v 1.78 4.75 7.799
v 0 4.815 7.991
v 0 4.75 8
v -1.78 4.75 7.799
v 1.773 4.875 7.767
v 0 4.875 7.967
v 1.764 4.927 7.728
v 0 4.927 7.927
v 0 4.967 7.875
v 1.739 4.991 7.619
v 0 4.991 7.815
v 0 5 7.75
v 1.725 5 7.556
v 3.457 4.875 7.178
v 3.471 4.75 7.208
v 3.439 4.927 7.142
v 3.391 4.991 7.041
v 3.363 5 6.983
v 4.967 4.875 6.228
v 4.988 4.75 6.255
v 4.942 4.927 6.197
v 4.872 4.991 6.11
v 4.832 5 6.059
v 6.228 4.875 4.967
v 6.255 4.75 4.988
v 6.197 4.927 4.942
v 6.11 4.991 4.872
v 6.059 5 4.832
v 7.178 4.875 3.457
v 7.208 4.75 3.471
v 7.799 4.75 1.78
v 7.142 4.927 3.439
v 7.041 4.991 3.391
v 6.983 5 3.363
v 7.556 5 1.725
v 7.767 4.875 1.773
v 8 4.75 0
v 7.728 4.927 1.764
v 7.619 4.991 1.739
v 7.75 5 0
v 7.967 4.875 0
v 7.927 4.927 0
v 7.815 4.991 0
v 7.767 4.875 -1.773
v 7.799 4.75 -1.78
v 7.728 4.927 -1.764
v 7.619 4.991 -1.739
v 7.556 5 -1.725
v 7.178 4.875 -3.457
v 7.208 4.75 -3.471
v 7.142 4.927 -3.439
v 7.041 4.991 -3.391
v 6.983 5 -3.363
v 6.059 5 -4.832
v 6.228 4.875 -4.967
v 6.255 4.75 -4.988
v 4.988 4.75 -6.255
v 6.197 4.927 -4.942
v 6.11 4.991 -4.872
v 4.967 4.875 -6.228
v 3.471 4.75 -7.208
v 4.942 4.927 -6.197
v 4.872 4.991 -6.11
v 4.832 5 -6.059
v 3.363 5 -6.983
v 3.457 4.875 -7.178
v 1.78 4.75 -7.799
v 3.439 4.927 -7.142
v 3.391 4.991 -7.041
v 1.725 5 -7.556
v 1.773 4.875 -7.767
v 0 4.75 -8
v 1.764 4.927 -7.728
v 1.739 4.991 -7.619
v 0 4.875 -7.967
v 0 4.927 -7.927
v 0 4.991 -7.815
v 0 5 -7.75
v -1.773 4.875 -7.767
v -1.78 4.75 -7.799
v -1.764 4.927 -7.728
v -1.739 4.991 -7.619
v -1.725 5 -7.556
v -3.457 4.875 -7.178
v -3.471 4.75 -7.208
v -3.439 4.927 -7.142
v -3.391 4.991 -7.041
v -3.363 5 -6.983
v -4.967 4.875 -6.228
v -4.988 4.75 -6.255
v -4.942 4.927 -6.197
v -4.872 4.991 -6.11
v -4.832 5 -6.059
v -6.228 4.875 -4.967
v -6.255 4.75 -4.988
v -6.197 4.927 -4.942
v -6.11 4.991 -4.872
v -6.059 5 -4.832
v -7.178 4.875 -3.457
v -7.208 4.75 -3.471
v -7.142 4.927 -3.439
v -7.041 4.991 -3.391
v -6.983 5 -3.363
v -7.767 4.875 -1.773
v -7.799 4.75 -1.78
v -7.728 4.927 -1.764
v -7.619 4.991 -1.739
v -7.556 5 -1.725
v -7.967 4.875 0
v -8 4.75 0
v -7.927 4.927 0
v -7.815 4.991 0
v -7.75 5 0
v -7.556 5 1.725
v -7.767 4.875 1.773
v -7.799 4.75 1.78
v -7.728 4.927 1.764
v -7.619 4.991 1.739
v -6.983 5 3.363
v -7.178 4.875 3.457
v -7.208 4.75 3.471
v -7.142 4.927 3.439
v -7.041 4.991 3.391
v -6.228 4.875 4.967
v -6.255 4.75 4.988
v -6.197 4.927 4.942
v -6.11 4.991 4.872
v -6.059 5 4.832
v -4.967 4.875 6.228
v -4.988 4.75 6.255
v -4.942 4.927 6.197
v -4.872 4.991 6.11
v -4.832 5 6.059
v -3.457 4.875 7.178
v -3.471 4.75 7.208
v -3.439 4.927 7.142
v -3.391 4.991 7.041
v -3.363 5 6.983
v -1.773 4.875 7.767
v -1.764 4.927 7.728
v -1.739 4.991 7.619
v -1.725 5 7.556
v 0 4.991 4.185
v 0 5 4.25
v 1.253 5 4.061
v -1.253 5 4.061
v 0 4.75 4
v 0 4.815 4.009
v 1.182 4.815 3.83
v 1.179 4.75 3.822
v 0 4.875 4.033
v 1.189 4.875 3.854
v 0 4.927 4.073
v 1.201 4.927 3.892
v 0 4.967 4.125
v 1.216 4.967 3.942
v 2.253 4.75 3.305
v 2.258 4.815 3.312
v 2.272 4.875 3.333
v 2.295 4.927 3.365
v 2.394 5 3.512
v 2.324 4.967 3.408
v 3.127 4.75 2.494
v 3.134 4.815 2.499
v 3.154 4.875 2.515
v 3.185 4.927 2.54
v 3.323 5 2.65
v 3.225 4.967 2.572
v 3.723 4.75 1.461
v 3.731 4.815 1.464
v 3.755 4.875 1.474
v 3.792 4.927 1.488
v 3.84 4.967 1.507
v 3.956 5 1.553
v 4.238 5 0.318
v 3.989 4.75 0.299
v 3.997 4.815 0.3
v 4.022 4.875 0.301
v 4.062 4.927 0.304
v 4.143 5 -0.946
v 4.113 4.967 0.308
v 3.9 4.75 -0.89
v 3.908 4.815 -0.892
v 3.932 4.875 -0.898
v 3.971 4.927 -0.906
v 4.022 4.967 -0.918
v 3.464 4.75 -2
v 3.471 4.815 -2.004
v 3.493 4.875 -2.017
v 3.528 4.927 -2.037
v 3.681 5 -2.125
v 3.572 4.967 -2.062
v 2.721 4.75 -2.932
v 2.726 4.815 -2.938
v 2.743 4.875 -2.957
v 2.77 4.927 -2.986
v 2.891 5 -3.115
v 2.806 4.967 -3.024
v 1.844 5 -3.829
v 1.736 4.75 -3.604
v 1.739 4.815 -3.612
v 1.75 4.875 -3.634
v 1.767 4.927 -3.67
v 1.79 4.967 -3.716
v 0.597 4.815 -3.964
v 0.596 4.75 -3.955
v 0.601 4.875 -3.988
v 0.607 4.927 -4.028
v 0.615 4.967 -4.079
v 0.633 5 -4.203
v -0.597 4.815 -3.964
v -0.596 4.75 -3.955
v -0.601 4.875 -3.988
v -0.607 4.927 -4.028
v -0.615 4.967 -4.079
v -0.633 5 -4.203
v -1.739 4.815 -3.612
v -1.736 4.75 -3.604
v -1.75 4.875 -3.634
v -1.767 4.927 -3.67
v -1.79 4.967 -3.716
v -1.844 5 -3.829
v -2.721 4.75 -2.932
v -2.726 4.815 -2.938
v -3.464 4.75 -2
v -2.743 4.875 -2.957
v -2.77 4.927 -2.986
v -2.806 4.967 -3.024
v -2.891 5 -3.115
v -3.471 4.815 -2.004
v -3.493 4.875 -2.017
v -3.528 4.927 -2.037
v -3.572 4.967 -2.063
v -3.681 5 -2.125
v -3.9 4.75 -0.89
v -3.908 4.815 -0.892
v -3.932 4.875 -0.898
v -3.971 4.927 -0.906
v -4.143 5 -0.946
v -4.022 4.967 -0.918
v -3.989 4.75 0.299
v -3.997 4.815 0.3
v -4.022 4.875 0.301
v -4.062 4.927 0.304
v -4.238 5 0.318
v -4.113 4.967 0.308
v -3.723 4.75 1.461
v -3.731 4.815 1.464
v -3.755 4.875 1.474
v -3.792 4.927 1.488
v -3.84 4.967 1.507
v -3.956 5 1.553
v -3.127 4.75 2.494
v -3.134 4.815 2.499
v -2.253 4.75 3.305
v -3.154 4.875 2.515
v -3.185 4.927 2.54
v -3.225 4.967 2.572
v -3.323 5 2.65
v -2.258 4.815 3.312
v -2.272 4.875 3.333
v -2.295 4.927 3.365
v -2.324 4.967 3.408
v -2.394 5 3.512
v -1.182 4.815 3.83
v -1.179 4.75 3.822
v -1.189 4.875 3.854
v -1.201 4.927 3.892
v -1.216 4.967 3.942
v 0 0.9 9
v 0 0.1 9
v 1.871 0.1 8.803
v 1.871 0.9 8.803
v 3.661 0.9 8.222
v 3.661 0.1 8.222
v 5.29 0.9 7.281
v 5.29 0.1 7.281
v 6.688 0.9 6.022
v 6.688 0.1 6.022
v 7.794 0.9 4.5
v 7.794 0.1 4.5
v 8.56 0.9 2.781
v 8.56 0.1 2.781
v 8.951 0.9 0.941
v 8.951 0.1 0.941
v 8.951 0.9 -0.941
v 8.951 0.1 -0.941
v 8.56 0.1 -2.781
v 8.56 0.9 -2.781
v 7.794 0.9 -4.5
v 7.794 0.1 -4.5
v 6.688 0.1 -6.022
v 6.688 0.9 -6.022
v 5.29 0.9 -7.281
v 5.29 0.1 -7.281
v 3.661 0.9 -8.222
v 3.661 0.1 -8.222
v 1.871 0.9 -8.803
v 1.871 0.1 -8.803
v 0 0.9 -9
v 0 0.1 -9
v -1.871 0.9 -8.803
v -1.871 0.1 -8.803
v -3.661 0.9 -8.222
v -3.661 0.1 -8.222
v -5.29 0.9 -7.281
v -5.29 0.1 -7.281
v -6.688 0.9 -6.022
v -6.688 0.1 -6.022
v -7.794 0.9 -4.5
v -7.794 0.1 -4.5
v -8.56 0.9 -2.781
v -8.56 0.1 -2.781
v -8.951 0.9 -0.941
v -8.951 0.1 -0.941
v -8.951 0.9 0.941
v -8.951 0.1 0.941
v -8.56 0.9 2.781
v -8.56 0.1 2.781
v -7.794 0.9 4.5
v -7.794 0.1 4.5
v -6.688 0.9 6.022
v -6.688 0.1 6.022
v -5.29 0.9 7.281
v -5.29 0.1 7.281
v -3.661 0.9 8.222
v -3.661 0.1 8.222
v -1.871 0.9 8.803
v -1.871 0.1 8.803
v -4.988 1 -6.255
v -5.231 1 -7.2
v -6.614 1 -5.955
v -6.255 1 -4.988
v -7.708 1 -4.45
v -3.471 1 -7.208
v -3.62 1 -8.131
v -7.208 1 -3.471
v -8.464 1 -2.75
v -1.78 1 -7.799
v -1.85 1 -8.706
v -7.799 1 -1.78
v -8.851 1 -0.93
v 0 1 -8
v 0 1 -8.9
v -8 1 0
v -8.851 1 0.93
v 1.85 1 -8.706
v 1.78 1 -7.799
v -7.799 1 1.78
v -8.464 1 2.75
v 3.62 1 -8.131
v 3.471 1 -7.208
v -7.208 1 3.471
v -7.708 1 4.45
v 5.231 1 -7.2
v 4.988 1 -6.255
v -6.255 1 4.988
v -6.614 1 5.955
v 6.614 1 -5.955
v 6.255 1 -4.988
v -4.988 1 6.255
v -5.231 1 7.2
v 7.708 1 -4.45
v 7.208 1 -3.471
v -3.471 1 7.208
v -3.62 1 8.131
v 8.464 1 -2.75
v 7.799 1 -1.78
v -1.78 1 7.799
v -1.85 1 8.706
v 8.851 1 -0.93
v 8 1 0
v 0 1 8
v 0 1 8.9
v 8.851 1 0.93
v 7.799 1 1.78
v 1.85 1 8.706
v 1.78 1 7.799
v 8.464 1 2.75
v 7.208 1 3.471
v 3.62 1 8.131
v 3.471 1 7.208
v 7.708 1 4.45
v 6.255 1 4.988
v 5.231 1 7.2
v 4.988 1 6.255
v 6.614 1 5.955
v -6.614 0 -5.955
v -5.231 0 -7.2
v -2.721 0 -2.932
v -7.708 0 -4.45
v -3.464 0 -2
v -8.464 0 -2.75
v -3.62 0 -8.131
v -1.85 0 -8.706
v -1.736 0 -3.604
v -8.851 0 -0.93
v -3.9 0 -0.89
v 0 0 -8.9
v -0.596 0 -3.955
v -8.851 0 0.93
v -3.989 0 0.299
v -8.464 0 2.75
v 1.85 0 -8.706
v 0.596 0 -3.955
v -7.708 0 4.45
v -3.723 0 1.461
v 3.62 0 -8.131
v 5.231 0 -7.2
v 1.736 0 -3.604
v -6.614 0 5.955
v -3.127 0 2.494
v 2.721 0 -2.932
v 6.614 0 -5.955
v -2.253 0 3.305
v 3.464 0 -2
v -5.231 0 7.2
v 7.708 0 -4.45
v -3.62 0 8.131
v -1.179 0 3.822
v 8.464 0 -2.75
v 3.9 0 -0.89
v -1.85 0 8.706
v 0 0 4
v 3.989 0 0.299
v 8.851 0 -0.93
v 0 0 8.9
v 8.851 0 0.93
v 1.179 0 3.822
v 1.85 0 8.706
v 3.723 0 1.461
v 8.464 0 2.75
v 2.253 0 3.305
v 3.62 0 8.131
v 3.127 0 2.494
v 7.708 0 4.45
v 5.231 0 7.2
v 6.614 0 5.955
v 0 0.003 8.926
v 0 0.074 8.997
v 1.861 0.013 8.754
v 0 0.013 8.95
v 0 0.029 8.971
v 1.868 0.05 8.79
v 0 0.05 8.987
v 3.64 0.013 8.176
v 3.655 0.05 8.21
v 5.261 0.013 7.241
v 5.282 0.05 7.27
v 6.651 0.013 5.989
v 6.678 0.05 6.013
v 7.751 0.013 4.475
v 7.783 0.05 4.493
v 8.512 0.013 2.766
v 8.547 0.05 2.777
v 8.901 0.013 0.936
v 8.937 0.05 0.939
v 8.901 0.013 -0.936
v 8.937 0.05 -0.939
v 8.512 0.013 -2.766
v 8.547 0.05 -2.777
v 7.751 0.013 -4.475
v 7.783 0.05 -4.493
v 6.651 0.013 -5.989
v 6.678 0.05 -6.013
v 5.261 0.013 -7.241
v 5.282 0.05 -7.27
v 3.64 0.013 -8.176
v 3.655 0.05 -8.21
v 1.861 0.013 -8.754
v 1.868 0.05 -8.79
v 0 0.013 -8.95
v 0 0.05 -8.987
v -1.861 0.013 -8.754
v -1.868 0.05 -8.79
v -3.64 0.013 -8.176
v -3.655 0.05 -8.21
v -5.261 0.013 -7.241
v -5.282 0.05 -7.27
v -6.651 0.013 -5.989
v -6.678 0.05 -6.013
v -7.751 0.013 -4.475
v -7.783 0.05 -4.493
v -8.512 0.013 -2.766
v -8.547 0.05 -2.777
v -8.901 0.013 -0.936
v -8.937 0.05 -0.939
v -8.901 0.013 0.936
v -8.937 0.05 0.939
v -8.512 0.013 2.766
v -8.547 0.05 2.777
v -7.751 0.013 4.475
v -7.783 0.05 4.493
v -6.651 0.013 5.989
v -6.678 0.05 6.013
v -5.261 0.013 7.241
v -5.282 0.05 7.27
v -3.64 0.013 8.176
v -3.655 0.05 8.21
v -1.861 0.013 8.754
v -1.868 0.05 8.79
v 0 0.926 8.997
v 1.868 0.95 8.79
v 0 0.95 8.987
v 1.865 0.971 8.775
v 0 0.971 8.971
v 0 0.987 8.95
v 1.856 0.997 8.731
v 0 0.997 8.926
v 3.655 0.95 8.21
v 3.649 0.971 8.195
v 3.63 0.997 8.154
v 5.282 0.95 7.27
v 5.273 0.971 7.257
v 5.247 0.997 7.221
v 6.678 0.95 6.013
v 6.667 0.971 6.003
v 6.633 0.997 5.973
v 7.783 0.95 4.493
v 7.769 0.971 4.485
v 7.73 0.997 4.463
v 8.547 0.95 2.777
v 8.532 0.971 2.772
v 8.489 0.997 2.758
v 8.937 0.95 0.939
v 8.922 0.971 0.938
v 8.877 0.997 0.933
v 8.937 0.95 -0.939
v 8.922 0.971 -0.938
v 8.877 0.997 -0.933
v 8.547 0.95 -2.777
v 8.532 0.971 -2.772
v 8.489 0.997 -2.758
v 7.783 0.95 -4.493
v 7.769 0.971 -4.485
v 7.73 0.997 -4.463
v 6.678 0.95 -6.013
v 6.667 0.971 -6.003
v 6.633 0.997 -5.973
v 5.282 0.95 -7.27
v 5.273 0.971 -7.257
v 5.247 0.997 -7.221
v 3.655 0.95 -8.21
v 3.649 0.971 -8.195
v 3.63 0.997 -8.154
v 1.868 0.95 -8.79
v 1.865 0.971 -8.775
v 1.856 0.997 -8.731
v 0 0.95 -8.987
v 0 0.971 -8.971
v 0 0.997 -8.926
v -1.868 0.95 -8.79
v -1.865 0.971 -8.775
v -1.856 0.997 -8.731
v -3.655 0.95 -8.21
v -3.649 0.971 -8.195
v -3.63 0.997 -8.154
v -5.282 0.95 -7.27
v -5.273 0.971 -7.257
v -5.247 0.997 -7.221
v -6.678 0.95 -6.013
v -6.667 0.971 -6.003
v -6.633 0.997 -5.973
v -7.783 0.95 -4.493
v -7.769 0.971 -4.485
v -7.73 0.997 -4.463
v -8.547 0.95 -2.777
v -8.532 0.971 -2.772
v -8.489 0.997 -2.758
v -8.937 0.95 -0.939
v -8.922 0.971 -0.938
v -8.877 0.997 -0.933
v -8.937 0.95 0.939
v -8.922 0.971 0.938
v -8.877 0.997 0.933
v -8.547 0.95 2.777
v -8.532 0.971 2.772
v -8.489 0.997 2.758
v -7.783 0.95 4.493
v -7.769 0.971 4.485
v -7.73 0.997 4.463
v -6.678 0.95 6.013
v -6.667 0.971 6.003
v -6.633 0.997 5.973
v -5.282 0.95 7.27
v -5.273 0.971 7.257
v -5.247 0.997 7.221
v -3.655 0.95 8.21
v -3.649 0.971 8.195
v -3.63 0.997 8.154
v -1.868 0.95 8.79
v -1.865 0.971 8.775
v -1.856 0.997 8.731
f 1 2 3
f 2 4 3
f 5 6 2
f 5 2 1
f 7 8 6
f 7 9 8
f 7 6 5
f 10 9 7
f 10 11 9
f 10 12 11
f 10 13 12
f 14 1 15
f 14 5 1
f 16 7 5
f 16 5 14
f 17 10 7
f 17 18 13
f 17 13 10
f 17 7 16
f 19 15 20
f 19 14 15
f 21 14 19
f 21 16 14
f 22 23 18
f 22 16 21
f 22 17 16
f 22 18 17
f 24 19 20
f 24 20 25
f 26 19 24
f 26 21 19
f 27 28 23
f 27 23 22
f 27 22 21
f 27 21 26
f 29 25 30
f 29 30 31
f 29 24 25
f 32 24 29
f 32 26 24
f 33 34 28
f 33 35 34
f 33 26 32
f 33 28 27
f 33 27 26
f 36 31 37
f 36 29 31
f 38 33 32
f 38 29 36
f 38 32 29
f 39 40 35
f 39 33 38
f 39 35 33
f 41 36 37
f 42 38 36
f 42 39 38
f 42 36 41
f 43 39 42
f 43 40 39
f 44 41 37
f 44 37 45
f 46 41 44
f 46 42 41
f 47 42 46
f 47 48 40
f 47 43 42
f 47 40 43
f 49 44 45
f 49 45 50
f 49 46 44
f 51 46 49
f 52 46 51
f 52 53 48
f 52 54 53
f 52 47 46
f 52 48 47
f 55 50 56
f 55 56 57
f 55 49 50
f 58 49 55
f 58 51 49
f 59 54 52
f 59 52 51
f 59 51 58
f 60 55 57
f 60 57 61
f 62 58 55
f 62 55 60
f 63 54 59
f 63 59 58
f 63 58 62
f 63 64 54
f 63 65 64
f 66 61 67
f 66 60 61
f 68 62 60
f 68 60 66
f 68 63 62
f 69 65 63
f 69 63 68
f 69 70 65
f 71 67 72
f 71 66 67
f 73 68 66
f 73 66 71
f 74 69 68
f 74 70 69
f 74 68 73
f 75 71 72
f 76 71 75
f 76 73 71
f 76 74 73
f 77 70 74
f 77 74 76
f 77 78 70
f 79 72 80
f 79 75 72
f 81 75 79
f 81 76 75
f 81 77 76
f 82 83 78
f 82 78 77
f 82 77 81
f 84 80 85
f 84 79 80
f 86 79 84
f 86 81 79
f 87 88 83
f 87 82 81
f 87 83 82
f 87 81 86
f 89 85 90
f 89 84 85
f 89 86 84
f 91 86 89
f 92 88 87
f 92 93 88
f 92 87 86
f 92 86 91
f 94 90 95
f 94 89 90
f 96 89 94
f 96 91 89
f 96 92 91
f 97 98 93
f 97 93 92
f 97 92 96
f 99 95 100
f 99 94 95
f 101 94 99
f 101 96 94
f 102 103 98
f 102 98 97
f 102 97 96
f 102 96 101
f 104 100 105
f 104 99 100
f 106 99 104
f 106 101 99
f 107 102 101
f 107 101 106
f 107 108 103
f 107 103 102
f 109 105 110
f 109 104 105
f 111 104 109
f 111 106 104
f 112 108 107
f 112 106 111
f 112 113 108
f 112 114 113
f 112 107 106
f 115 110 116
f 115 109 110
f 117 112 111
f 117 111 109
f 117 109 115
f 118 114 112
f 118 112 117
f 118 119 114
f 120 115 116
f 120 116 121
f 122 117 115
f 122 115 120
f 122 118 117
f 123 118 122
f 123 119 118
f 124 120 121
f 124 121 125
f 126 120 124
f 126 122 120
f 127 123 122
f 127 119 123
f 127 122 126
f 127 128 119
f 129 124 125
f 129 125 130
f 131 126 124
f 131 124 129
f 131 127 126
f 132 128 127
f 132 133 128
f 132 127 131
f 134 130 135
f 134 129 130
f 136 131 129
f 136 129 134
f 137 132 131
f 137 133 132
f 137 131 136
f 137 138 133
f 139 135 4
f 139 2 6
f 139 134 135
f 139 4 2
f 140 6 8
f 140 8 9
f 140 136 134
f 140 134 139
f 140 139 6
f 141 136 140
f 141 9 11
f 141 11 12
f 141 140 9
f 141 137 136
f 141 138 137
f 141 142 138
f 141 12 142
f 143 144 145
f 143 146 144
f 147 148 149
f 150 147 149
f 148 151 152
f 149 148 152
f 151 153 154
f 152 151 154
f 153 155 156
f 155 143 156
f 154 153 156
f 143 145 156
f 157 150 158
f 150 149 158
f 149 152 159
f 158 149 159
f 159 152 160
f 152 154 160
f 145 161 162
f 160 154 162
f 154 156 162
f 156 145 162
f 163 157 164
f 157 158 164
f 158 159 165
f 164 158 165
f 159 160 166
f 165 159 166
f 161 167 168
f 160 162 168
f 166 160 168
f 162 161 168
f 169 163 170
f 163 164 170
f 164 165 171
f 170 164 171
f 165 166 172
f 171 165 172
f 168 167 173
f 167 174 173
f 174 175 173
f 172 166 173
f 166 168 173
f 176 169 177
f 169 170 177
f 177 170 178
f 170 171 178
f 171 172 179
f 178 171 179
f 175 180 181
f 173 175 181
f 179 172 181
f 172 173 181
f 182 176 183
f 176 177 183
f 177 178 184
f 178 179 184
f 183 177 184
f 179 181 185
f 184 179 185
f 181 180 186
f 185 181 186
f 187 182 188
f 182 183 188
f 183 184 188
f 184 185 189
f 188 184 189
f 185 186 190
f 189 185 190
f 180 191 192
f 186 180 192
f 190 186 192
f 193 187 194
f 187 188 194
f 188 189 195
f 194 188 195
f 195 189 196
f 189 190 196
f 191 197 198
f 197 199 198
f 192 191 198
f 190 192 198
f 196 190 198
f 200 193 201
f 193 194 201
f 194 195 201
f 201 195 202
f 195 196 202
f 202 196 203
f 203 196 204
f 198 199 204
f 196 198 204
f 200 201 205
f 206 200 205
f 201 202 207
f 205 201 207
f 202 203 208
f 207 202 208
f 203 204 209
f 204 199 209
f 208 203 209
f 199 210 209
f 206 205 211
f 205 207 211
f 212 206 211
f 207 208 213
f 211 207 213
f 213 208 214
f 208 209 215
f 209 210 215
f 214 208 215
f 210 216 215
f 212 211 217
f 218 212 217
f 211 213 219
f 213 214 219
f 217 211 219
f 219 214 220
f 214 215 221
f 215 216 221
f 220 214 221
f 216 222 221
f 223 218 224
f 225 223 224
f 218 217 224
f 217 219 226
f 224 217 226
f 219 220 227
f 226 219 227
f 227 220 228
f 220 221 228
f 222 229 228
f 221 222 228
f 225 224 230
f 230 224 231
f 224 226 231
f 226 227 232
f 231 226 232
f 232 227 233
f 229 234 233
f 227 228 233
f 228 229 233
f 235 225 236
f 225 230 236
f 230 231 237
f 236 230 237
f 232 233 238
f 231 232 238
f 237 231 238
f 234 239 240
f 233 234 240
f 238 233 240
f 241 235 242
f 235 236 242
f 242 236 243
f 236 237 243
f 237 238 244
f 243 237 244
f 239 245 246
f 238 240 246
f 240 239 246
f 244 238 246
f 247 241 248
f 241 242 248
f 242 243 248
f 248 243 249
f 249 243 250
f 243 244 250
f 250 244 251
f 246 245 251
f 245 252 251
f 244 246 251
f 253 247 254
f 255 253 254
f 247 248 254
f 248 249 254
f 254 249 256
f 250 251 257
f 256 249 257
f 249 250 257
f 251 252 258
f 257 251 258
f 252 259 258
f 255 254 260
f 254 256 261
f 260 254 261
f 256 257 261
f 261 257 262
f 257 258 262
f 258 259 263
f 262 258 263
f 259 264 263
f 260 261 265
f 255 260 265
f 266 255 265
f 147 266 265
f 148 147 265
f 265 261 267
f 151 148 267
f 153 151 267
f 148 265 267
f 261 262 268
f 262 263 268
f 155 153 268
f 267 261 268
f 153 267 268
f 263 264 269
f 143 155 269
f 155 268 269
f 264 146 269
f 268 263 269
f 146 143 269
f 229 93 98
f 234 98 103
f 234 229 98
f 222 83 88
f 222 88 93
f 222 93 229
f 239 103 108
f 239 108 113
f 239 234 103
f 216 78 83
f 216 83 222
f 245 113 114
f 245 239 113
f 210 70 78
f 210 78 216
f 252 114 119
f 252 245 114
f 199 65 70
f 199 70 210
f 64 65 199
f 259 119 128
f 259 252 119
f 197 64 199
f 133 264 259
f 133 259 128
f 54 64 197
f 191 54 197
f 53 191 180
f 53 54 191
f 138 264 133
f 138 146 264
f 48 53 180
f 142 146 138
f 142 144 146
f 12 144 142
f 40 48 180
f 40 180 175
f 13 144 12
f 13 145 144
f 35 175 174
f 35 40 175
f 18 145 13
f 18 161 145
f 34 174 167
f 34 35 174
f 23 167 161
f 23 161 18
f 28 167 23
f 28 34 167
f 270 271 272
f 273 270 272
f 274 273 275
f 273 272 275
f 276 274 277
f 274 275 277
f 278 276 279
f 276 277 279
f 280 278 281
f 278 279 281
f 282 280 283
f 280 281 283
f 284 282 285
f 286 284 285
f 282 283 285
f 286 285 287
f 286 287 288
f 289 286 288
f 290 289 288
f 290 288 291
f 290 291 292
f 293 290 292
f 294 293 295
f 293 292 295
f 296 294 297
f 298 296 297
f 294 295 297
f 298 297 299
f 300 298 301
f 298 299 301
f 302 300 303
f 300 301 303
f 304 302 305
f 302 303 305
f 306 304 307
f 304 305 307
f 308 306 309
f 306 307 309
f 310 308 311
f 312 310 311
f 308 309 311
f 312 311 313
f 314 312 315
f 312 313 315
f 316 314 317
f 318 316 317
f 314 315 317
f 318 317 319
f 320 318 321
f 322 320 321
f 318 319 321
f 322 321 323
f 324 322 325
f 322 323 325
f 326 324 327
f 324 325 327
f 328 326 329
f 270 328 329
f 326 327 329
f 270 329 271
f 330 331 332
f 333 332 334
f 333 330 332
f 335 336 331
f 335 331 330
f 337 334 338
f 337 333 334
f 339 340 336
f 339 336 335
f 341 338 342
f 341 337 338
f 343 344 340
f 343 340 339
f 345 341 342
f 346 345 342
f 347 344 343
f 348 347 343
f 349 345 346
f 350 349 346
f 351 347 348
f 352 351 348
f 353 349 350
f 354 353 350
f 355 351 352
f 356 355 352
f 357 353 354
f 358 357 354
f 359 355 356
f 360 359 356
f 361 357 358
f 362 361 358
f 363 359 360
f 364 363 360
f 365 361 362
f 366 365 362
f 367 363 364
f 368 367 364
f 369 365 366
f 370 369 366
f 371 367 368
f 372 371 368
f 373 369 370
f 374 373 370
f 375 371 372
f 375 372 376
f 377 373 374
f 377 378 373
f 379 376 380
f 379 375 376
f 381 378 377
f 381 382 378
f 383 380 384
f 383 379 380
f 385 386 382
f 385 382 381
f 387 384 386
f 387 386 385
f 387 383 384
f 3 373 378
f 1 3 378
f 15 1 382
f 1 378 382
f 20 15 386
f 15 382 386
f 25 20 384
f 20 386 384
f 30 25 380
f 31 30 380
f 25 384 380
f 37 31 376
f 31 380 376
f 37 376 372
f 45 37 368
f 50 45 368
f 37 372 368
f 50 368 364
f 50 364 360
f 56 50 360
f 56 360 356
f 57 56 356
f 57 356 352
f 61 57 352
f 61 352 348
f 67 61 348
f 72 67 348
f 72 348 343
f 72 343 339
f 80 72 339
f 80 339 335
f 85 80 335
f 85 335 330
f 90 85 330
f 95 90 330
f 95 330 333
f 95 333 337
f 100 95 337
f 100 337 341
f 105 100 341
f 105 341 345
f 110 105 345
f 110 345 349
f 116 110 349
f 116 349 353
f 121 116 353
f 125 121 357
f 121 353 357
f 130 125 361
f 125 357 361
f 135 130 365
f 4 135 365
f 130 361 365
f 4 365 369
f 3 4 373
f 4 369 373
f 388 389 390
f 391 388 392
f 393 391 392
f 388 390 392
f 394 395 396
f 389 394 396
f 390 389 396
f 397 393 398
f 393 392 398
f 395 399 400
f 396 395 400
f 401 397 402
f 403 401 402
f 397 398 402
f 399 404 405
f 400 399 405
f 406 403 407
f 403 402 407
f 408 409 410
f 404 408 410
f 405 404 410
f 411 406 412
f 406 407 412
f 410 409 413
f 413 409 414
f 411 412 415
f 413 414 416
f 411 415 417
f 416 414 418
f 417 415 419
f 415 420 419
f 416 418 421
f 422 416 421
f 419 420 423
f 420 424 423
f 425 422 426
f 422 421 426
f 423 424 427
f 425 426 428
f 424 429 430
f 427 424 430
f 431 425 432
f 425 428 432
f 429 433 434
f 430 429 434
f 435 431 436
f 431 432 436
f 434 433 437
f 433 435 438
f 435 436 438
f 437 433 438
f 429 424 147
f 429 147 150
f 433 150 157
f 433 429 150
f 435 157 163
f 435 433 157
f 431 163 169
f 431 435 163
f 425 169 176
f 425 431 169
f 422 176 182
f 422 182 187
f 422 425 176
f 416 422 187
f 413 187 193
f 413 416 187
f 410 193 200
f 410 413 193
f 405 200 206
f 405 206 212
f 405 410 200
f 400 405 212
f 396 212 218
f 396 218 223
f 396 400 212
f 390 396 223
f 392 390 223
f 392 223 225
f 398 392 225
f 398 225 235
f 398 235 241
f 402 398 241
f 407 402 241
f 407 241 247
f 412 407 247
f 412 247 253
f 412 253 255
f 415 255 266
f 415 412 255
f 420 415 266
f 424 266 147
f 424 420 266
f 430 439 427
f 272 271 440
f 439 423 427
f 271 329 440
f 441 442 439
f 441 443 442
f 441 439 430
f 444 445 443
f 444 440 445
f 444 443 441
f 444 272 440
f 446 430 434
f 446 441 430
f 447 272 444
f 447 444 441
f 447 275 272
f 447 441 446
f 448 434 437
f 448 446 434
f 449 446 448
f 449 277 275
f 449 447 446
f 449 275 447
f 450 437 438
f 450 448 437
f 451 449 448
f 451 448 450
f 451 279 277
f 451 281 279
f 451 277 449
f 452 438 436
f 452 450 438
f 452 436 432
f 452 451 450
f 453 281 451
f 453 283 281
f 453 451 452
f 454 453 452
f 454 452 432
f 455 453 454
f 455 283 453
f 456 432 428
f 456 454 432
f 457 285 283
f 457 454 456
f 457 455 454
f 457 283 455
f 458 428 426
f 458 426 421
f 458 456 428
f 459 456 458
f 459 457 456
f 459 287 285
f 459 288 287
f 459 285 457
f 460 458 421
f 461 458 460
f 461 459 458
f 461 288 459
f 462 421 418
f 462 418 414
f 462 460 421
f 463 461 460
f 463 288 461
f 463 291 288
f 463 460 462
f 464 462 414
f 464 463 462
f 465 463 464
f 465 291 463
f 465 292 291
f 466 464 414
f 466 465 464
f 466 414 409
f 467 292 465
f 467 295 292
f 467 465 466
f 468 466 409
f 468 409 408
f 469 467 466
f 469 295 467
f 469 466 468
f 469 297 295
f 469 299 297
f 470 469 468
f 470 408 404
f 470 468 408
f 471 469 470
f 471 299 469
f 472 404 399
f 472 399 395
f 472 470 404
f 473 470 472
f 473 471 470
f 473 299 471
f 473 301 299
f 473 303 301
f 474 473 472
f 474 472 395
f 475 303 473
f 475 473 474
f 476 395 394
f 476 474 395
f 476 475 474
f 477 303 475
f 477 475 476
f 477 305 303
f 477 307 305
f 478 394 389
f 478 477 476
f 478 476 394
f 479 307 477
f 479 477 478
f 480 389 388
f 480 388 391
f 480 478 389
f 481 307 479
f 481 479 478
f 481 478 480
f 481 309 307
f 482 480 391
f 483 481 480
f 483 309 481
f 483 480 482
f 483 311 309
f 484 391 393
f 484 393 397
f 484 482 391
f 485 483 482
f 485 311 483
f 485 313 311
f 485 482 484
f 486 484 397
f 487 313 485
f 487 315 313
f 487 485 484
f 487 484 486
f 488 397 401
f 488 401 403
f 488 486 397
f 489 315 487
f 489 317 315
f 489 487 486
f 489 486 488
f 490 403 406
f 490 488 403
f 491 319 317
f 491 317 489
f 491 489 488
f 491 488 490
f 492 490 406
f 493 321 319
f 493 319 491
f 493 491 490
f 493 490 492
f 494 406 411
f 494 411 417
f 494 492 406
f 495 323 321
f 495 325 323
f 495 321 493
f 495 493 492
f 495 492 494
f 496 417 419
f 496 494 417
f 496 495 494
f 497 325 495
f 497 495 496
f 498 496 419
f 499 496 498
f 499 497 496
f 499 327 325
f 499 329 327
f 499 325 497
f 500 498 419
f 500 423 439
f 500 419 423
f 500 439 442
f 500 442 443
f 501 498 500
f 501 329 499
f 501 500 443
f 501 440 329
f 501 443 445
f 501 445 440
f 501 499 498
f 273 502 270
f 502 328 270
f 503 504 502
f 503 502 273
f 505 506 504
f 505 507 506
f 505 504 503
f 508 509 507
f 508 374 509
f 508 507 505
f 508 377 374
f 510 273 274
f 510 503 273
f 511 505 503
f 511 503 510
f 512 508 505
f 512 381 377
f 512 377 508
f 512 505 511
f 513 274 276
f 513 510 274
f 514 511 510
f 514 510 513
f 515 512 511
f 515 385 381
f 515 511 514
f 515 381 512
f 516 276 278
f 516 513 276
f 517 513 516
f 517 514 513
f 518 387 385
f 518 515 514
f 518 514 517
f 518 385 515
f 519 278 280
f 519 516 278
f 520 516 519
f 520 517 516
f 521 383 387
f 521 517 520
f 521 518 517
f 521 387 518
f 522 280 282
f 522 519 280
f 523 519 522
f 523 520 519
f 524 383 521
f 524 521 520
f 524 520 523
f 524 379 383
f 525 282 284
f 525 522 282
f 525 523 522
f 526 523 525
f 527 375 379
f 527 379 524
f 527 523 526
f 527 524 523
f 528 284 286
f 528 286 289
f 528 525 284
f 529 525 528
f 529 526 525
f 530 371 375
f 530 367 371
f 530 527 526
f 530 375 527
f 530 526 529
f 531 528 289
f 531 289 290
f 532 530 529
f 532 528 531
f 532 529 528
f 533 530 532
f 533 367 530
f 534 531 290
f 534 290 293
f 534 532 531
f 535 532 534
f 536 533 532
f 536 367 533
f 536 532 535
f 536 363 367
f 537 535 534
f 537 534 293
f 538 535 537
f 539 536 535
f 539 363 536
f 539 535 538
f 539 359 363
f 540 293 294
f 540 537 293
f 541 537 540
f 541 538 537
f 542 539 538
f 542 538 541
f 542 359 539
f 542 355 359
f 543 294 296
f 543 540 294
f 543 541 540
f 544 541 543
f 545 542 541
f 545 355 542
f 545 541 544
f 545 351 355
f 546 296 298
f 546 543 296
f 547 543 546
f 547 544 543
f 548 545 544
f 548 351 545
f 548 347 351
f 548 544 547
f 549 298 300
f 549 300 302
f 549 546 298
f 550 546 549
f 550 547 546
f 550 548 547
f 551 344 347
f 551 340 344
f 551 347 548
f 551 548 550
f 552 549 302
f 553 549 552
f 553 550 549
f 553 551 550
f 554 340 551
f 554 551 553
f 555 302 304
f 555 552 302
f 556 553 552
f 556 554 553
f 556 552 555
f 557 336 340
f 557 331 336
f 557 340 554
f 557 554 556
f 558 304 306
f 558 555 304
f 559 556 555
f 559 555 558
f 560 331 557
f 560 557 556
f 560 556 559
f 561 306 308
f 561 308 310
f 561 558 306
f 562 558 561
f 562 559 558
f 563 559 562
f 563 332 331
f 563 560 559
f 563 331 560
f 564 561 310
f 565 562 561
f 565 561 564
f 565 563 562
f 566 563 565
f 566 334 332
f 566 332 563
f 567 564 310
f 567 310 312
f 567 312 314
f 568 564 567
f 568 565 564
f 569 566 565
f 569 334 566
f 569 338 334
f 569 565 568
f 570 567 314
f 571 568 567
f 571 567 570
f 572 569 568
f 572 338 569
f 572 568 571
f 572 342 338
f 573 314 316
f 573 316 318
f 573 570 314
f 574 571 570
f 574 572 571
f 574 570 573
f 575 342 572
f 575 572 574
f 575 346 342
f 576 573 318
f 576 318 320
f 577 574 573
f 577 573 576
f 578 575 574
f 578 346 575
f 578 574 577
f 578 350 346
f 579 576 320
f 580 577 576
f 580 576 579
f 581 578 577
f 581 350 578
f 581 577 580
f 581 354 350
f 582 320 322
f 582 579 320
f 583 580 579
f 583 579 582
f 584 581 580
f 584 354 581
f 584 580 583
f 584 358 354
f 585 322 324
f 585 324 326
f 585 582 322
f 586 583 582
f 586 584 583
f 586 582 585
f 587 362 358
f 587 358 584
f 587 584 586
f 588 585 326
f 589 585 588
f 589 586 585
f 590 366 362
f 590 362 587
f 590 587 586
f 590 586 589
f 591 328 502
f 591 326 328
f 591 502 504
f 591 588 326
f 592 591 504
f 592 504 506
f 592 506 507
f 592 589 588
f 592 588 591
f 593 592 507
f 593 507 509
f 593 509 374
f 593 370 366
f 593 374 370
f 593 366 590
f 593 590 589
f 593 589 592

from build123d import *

# Parameters (mm, degrees)
CROQUIS7_R              = 8
SALIENTE_EXTRUIR3_DEPTH = 5
CROQUIS4_R              = 9
SALIENTE_EXTRUIR4_DEPTH = 1
CROQUIS10_R             = 4
CORTAR_EXTRUIR2_DEPTH   = 5
REDONDEO1_R             = 0.25
REDONDEO2_R             = 0.1


with BuildPart() as part:
    # Croquis7 → Saliente-Extruir3 (new body)
    with BuildSketch(Plane(origin=(0, 0, 0), x_dir=(1, 0, 0), z_dir=(0, 1, 0))):
        with Locations(Location((0, 0, 0), (0, 0, 270))):
            Circle(CROQUIS7_R)
    extrude(amount=SALIENTE_EXTRUIR3_DEPTH)

    # Croquis4 → Saliente-Extruir4 (add)
    with BuildSketch(Plane(origin=(0, 0, 0), x_dir=(1, 0, 0), z_dir=(0, 1, 0))):
        with Locations(Location((0, 0, 0), (0, 0, 270))):
            Circle(CROQUIS4_R)
    extrude(amount=SALIENTE_EXTRUIR4_DEPTH)

    # Croquis10 → Cortar-Extruir2 (cut)
    with BuildSketch(Plane(origin=(0, 0, 0), x_dir=(1, 0, 0), z_dir=(0, 1, 0))):
        with Locations(Location((0, 0, 0), (0, 0, 270))):
            Circle(CROQUIS10_R)
    extrude(amount=CORTAR_EXTRUIR2_DEPTH, mode=Mode.SUBTRACT)

    # Redondeo1
    redondeo1_edges = [part.edges().sort_by_distance(p)[0] for p in [
        (0, 5, -4),
        (0, 5, -8),
    ]]
    fillet(redondeo1_edges, radius=REDONDEO1_R)

    # Redondeo2
    redondeo2_edges = [part.edges().sort_by_distance(p)[0] for p in [
        (0, 0, -9),
        (0, 1, -9),
    ]]
    fillet(redondeo2_edges, radius=REDONDEO2_R)


solid = part.part
